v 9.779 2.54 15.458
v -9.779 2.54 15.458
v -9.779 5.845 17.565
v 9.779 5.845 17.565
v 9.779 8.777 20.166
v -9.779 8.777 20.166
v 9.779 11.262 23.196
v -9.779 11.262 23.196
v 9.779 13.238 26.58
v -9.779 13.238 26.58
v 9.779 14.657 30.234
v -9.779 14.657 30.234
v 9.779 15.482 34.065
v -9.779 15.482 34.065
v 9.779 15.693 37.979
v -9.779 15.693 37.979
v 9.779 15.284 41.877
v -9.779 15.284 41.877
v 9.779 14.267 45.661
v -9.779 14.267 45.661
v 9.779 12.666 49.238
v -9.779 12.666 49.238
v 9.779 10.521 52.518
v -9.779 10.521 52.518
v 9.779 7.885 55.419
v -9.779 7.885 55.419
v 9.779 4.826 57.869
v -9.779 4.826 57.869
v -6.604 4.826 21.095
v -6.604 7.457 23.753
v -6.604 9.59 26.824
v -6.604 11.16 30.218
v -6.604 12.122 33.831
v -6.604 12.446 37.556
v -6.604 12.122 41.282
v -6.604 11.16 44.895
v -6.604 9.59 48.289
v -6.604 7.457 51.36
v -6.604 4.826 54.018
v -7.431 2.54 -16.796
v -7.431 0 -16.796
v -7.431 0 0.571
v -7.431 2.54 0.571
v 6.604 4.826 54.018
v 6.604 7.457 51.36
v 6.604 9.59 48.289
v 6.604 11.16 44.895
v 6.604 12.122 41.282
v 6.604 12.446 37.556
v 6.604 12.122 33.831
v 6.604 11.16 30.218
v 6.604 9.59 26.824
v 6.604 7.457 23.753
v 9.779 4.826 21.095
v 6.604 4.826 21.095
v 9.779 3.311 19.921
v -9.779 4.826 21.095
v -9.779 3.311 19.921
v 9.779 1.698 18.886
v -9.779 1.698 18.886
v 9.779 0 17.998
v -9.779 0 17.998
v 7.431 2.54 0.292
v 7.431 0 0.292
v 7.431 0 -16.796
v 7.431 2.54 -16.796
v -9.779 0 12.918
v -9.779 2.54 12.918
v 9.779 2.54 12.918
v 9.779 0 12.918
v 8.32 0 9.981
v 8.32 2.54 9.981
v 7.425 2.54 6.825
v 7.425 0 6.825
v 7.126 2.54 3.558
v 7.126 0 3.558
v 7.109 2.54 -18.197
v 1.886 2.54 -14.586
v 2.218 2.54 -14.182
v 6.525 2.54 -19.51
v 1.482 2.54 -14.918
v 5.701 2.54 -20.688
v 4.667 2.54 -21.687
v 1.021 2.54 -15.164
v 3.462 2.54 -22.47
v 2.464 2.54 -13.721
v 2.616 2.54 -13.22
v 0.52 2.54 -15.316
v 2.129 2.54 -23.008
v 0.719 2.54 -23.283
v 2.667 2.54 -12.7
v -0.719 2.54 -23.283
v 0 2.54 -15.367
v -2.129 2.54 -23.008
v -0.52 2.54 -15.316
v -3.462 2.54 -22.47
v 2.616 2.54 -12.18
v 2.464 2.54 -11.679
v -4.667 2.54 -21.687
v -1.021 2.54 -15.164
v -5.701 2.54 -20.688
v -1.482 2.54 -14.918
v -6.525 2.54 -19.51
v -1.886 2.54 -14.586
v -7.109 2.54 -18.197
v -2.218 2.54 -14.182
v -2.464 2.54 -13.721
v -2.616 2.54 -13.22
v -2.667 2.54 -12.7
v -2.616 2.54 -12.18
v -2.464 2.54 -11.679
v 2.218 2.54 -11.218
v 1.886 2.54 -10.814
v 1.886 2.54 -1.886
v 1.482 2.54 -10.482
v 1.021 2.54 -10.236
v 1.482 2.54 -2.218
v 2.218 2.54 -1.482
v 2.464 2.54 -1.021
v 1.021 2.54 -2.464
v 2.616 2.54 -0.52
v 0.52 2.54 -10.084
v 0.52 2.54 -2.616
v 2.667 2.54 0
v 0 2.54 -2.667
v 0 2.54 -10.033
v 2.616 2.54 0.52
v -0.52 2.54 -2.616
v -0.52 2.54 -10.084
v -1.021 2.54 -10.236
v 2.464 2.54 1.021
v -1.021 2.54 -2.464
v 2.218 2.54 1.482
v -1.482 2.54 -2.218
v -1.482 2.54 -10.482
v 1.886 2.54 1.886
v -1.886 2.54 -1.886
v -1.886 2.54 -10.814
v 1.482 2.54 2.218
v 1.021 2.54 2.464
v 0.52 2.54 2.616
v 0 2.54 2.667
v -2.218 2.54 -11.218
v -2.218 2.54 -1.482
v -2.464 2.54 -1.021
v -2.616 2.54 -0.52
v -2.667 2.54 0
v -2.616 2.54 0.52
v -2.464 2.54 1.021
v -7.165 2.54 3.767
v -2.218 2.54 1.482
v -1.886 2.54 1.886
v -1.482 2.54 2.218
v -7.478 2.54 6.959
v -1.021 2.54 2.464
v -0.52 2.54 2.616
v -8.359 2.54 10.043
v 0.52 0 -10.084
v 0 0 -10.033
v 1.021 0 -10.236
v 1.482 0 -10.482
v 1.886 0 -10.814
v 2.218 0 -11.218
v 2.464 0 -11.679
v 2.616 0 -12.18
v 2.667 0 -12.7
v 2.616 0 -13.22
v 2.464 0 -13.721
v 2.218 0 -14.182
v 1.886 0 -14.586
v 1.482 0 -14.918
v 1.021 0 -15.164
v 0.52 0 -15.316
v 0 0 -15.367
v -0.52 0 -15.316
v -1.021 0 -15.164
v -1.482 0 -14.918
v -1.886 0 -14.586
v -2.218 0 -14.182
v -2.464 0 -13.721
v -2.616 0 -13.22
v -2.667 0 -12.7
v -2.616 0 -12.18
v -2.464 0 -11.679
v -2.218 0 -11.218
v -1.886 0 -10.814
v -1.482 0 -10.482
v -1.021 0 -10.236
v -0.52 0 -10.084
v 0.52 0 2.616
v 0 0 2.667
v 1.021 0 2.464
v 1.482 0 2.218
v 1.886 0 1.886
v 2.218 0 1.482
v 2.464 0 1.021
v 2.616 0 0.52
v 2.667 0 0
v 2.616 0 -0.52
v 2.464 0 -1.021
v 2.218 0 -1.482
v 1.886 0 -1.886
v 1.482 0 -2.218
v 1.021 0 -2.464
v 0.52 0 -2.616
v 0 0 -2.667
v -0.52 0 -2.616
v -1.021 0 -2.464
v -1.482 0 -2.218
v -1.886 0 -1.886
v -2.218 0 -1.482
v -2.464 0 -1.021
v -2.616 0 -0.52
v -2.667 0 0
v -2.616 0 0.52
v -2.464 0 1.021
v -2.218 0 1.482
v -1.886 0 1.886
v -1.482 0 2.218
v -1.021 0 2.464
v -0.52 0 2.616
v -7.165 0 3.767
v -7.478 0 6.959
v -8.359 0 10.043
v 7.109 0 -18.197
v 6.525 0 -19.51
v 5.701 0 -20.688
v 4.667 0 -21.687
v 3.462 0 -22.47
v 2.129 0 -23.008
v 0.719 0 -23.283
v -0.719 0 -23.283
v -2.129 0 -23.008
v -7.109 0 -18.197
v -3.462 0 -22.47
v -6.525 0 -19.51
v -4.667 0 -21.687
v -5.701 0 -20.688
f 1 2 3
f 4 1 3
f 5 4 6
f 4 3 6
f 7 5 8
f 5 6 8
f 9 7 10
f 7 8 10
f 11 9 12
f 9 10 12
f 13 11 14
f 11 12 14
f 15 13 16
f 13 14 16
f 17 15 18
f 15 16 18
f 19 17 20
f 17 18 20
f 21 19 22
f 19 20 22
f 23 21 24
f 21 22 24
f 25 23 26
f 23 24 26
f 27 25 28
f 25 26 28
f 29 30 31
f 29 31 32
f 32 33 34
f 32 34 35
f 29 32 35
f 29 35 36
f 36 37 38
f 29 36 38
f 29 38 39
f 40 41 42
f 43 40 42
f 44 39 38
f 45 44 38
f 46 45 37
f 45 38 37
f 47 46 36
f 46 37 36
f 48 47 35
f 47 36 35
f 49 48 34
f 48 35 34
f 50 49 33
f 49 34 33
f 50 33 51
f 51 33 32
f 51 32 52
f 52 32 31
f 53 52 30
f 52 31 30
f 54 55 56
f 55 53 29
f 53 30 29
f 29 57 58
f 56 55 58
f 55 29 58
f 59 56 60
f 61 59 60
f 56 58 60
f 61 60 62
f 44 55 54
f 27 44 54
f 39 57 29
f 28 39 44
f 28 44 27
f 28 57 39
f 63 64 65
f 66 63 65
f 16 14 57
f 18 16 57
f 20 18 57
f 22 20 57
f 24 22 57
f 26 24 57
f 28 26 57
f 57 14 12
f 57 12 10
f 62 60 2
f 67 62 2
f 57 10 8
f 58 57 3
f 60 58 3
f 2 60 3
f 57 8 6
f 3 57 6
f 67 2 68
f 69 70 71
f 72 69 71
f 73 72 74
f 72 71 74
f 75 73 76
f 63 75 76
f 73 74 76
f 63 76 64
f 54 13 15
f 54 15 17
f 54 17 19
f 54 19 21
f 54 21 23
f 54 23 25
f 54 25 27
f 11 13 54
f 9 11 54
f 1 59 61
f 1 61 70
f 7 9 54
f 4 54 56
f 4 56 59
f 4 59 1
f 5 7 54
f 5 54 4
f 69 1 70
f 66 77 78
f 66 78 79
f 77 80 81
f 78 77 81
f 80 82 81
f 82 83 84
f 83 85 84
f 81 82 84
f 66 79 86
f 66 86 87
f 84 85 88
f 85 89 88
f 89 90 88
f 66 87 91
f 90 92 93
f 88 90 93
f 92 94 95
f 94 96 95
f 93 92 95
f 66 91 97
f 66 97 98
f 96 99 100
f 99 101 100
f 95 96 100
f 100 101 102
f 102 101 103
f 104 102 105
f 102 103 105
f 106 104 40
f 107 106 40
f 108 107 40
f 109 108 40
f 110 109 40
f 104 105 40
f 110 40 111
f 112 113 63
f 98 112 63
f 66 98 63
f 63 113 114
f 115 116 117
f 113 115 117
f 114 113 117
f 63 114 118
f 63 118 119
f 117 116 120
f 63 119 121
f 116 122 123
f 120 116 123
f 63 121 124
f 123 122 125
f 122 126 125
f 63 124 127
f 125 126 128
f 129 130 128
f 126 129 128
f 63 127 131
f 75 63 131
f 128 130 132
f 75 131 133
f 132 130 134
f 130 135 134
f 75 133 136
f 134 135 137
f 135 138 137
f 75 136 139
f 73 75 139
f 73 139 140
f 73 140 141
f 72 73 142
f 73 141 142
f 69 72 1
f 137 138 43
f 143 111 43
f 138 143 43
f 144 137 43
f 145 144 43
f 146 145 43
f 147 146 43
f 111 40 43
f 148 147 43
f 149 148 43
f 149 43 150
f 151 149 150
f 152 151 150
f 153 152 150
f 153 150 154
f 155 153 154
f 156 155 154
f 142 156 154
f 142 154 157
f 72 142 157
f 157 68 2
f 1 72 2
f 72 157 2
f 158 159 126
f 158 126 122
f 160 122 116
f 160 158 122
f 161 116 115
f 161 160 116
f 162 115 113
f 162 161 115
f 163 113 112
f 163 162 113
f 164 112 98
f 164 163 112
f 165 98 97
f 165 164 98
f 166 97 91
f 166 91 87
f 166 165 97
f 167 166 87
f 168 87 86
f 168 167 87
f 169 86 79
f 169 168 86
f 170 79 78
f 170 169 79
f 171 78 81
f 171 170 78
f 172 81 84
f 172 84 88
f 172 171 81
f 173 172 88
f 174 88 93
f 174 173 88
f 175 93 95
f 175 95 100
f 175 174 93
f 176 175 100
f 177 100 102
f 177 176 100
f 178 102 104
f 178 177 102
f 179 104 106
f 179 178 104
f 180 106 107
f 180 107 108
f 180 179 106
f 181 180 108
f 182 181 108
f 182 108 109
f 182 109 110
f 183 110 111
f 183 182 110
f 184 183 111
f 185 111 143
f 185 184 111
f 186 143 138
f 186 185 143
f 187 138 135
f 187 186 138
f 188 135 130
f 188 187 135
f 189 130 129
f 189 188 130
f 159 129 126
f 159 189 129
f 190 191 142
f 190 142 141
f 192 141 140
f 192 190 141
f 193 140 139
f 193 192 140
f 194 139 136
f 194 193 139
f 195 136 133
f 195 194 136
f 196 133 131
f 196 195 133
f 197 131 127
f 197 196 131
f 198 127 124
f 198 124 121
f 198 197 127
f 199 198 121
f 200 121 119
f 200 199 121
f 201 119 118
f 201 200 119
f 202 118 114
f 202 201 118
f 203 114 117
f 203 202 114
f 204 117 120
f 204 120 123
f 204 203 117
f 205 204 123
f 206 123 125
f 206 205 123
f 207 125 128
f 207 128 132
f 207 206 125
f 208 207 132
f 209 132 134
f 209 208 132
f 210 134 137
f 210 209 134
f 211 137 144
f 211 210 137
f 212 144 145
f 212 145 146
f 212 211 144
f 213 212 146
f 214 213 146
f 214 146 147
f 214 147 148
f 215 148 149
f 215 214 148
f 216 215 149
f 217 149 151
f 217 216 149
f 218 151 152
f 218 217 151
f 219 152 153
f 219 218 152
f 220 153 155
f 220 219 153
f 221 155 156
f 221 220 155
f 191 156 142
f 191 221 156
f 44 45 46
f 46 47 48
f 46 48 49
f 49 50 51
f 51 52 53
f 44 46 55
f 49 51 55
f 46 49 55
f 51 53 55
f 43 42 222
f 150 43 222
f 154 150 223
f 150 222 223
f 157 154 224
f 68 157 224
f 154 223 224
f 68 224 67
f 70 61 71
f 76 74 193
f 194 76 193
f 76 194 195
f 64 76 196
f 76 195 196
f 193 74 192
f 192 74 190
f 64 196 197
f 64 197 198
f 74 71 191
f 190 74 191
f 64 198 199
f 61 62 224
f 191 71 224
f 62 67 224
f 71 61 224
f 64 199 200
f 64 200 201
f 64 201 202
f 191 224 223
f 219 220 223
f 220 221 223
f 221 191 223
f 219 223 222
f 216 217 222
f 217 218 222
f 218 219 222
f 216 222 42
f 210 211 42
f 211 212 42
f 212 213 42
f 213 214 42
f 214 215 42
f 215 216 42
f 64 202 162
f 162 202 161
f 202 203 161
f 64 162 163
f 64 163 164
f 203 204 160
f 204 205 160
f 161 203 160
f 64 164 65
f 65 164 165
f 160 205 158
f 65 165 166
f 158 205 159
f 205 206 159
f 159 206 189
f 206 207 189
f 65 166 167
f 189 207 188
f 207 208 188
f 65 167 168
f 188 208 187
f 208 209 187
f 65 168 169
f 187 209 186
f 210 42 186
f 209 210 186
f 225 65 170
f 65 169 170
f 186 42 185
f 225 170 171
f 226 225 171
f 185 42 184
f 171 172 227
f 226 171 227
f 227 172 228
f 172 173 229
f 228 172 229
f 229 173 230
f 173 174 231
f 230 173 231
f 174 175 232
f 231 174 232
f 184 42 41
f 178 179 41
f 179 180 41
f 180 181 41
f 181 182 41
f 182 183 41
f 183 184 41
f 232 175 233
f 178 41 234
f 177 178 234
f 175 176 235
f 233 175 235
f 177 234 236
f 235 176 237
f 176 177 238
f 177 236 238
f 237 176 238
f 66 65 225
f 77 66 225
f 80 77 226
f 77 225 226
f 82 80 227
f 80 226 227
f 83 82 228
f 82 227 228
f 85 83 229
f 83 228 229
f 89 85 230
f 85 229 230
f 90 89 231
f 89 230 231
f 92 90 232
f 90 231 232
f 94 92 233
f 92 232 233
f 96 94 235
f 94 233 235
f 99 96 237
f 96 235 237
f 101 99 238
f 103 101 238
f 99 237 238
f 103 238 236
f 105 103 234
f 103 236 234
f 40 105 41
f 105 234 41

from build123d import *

# Parameters (mm, degrees)
SKETCH1_R                = 2.667
BOSS_EXTRUDE1_DEPTH      = 2.54
BOSS_EXTRUDE7_DEPTH      = 9.779
BOSS_EXTRUDE7_DEPTH_BACK = 9.779
BOSS_EXTRUDE8_DEPTH      = 3.175
BOSS_EXTRUDE9_START      = -3.175
BOSS_EXTRUDE9_DEPTH      = 3.175
CUT_EXTRUDE1_DEPTH       = 66.415448629


with BuildPart() as part:
    # Sketch1 → Boss-Extrude1 (new body)
    with BuildSketch(Plane(origin=(0, 0, 0), x_dir=(1, 0, 0), z_dir=(0, 1, 0))):
        with BuildLine():
            Line((-9.779, -12.918471663), (9.779, -12.918471663))
            ThreePointArc((9.779, -12.918471663), (7.425363666, -6.824700874), (7.431379329, -0.292196741))
            Line((7.431379329, -0.292196741), (7.431379329, 16.796462376))
            ThreePointArc((7.431379329, 16.796462376), (0, 23.317357624), (-7.431379329, 16.796462376))
            Line((-7.431379329, 16.796462376), (-7.431379329, -0.57095897))
            ThreePointArc((-7.431379329, -0.57095897), (-7.47774388, -6.959075495), (-9.779, -12.918471663))
        make_face()
        with Locations(Location((0, 0, 0), (0, 0, 270))):
            Circle(SKETCH1_R, mode=Mode.SUBTRACT)
        with Locations(Location((0, 12.7, 0), (0, 0, 270))):
            Circle(SKETCH1_R, mode=Mode.SUBTRACT)
    extrude(amount=BOSS_EXTRUDE1_DEPTH)

    # Sketch2 → Boss-Extrude7 (add, two sides: drawn at the far end of the back side and taken through both)
    with BuildSketch(Plane(origin=(0, 0, 0), x_dir=(0, 0, -1), z_dir=(1, 0, 0)).offset(-BOSS_EXTRUDE7_DEPTH_BACK)):
        with BuildLine():
            Line((-60.416471663, 0), (-57.114471663, 0))
            ThreePointArc((-57.114471663, 0), (-37.556471663, 12.446), (-17.998471663, 0))
            Line((-17.998471663, 0), (-12.918471663, 0))
            Line((-12.918471663, 0), (-12.918471663, 2.54))
            Line((-12.918471663, 2.54), (-15.458471663, 2.54))
            ThreePointArc((-15.458471663, 2.54), (-38.750541785, 15.661341156), (-60.416471663, 0))
        make_face()
    extrude(amount=BOSS_EXTRUDE7_DEPTH + BOSS_EXTRUDE7_DEPTH_BACK)

    # Sketch8 → Boss-Extrude8 (add)
    with BuildSketch(Plane.ZY.offset(9.779)):
        with BuildLine():
            Line((21.095390289, 4.826), (54.017553037, 4.826))
            ThreePointArc((54.017553037, 4.826), (37.556471663, 12.446), (21.095390289, 4.826))
        make_face()
    extrude(amount=-BOSS_EXTRUDE8_DEPTH)

    # Sketch9 → Boss-Extrude9 (add)
    with BuildSketch(Plane(origin=(9.779, 0, 0), x_dir=(0, 0, -1), z_dir=(1, 0, 0)).offset(BOSS_EXTRUDE9_START)):
        with BuildLine():
            Line((-54.017553037, 4.826), (-21.095390289, 4.826))
            ThreePointArc((-21.095390289, 4.826), (-37.556471663, 12.446), (-54.017553037, 4.826))
        make_face()
    extrude(amount=BOSS_EXTRUDE9_DEPTH)

    # Sketch10 → Cut-Extrude1 (cut, through all)
    with BuildSketch(Plane.ZY.offset(9.779)):
        with BuildLine():
            Line((54.017553037, 4.826), (57.868824209, 4.826))
            ThreePointArc((57.868824209, 4.826), (59.275844237, 2.483314384), (60.416471663, 0))
            Line((60.416471663, 0), (57.114471663, 0))
            ThreePointArc((57.114471663, 0), (55.726945646, 2.516273378), (54.017553037, 4.826))
        make_face()
    extrude(amount=-CUT_EXTRUDE1_DEPTH, mode=Mode.SUBTRACT)


solid = part.part
